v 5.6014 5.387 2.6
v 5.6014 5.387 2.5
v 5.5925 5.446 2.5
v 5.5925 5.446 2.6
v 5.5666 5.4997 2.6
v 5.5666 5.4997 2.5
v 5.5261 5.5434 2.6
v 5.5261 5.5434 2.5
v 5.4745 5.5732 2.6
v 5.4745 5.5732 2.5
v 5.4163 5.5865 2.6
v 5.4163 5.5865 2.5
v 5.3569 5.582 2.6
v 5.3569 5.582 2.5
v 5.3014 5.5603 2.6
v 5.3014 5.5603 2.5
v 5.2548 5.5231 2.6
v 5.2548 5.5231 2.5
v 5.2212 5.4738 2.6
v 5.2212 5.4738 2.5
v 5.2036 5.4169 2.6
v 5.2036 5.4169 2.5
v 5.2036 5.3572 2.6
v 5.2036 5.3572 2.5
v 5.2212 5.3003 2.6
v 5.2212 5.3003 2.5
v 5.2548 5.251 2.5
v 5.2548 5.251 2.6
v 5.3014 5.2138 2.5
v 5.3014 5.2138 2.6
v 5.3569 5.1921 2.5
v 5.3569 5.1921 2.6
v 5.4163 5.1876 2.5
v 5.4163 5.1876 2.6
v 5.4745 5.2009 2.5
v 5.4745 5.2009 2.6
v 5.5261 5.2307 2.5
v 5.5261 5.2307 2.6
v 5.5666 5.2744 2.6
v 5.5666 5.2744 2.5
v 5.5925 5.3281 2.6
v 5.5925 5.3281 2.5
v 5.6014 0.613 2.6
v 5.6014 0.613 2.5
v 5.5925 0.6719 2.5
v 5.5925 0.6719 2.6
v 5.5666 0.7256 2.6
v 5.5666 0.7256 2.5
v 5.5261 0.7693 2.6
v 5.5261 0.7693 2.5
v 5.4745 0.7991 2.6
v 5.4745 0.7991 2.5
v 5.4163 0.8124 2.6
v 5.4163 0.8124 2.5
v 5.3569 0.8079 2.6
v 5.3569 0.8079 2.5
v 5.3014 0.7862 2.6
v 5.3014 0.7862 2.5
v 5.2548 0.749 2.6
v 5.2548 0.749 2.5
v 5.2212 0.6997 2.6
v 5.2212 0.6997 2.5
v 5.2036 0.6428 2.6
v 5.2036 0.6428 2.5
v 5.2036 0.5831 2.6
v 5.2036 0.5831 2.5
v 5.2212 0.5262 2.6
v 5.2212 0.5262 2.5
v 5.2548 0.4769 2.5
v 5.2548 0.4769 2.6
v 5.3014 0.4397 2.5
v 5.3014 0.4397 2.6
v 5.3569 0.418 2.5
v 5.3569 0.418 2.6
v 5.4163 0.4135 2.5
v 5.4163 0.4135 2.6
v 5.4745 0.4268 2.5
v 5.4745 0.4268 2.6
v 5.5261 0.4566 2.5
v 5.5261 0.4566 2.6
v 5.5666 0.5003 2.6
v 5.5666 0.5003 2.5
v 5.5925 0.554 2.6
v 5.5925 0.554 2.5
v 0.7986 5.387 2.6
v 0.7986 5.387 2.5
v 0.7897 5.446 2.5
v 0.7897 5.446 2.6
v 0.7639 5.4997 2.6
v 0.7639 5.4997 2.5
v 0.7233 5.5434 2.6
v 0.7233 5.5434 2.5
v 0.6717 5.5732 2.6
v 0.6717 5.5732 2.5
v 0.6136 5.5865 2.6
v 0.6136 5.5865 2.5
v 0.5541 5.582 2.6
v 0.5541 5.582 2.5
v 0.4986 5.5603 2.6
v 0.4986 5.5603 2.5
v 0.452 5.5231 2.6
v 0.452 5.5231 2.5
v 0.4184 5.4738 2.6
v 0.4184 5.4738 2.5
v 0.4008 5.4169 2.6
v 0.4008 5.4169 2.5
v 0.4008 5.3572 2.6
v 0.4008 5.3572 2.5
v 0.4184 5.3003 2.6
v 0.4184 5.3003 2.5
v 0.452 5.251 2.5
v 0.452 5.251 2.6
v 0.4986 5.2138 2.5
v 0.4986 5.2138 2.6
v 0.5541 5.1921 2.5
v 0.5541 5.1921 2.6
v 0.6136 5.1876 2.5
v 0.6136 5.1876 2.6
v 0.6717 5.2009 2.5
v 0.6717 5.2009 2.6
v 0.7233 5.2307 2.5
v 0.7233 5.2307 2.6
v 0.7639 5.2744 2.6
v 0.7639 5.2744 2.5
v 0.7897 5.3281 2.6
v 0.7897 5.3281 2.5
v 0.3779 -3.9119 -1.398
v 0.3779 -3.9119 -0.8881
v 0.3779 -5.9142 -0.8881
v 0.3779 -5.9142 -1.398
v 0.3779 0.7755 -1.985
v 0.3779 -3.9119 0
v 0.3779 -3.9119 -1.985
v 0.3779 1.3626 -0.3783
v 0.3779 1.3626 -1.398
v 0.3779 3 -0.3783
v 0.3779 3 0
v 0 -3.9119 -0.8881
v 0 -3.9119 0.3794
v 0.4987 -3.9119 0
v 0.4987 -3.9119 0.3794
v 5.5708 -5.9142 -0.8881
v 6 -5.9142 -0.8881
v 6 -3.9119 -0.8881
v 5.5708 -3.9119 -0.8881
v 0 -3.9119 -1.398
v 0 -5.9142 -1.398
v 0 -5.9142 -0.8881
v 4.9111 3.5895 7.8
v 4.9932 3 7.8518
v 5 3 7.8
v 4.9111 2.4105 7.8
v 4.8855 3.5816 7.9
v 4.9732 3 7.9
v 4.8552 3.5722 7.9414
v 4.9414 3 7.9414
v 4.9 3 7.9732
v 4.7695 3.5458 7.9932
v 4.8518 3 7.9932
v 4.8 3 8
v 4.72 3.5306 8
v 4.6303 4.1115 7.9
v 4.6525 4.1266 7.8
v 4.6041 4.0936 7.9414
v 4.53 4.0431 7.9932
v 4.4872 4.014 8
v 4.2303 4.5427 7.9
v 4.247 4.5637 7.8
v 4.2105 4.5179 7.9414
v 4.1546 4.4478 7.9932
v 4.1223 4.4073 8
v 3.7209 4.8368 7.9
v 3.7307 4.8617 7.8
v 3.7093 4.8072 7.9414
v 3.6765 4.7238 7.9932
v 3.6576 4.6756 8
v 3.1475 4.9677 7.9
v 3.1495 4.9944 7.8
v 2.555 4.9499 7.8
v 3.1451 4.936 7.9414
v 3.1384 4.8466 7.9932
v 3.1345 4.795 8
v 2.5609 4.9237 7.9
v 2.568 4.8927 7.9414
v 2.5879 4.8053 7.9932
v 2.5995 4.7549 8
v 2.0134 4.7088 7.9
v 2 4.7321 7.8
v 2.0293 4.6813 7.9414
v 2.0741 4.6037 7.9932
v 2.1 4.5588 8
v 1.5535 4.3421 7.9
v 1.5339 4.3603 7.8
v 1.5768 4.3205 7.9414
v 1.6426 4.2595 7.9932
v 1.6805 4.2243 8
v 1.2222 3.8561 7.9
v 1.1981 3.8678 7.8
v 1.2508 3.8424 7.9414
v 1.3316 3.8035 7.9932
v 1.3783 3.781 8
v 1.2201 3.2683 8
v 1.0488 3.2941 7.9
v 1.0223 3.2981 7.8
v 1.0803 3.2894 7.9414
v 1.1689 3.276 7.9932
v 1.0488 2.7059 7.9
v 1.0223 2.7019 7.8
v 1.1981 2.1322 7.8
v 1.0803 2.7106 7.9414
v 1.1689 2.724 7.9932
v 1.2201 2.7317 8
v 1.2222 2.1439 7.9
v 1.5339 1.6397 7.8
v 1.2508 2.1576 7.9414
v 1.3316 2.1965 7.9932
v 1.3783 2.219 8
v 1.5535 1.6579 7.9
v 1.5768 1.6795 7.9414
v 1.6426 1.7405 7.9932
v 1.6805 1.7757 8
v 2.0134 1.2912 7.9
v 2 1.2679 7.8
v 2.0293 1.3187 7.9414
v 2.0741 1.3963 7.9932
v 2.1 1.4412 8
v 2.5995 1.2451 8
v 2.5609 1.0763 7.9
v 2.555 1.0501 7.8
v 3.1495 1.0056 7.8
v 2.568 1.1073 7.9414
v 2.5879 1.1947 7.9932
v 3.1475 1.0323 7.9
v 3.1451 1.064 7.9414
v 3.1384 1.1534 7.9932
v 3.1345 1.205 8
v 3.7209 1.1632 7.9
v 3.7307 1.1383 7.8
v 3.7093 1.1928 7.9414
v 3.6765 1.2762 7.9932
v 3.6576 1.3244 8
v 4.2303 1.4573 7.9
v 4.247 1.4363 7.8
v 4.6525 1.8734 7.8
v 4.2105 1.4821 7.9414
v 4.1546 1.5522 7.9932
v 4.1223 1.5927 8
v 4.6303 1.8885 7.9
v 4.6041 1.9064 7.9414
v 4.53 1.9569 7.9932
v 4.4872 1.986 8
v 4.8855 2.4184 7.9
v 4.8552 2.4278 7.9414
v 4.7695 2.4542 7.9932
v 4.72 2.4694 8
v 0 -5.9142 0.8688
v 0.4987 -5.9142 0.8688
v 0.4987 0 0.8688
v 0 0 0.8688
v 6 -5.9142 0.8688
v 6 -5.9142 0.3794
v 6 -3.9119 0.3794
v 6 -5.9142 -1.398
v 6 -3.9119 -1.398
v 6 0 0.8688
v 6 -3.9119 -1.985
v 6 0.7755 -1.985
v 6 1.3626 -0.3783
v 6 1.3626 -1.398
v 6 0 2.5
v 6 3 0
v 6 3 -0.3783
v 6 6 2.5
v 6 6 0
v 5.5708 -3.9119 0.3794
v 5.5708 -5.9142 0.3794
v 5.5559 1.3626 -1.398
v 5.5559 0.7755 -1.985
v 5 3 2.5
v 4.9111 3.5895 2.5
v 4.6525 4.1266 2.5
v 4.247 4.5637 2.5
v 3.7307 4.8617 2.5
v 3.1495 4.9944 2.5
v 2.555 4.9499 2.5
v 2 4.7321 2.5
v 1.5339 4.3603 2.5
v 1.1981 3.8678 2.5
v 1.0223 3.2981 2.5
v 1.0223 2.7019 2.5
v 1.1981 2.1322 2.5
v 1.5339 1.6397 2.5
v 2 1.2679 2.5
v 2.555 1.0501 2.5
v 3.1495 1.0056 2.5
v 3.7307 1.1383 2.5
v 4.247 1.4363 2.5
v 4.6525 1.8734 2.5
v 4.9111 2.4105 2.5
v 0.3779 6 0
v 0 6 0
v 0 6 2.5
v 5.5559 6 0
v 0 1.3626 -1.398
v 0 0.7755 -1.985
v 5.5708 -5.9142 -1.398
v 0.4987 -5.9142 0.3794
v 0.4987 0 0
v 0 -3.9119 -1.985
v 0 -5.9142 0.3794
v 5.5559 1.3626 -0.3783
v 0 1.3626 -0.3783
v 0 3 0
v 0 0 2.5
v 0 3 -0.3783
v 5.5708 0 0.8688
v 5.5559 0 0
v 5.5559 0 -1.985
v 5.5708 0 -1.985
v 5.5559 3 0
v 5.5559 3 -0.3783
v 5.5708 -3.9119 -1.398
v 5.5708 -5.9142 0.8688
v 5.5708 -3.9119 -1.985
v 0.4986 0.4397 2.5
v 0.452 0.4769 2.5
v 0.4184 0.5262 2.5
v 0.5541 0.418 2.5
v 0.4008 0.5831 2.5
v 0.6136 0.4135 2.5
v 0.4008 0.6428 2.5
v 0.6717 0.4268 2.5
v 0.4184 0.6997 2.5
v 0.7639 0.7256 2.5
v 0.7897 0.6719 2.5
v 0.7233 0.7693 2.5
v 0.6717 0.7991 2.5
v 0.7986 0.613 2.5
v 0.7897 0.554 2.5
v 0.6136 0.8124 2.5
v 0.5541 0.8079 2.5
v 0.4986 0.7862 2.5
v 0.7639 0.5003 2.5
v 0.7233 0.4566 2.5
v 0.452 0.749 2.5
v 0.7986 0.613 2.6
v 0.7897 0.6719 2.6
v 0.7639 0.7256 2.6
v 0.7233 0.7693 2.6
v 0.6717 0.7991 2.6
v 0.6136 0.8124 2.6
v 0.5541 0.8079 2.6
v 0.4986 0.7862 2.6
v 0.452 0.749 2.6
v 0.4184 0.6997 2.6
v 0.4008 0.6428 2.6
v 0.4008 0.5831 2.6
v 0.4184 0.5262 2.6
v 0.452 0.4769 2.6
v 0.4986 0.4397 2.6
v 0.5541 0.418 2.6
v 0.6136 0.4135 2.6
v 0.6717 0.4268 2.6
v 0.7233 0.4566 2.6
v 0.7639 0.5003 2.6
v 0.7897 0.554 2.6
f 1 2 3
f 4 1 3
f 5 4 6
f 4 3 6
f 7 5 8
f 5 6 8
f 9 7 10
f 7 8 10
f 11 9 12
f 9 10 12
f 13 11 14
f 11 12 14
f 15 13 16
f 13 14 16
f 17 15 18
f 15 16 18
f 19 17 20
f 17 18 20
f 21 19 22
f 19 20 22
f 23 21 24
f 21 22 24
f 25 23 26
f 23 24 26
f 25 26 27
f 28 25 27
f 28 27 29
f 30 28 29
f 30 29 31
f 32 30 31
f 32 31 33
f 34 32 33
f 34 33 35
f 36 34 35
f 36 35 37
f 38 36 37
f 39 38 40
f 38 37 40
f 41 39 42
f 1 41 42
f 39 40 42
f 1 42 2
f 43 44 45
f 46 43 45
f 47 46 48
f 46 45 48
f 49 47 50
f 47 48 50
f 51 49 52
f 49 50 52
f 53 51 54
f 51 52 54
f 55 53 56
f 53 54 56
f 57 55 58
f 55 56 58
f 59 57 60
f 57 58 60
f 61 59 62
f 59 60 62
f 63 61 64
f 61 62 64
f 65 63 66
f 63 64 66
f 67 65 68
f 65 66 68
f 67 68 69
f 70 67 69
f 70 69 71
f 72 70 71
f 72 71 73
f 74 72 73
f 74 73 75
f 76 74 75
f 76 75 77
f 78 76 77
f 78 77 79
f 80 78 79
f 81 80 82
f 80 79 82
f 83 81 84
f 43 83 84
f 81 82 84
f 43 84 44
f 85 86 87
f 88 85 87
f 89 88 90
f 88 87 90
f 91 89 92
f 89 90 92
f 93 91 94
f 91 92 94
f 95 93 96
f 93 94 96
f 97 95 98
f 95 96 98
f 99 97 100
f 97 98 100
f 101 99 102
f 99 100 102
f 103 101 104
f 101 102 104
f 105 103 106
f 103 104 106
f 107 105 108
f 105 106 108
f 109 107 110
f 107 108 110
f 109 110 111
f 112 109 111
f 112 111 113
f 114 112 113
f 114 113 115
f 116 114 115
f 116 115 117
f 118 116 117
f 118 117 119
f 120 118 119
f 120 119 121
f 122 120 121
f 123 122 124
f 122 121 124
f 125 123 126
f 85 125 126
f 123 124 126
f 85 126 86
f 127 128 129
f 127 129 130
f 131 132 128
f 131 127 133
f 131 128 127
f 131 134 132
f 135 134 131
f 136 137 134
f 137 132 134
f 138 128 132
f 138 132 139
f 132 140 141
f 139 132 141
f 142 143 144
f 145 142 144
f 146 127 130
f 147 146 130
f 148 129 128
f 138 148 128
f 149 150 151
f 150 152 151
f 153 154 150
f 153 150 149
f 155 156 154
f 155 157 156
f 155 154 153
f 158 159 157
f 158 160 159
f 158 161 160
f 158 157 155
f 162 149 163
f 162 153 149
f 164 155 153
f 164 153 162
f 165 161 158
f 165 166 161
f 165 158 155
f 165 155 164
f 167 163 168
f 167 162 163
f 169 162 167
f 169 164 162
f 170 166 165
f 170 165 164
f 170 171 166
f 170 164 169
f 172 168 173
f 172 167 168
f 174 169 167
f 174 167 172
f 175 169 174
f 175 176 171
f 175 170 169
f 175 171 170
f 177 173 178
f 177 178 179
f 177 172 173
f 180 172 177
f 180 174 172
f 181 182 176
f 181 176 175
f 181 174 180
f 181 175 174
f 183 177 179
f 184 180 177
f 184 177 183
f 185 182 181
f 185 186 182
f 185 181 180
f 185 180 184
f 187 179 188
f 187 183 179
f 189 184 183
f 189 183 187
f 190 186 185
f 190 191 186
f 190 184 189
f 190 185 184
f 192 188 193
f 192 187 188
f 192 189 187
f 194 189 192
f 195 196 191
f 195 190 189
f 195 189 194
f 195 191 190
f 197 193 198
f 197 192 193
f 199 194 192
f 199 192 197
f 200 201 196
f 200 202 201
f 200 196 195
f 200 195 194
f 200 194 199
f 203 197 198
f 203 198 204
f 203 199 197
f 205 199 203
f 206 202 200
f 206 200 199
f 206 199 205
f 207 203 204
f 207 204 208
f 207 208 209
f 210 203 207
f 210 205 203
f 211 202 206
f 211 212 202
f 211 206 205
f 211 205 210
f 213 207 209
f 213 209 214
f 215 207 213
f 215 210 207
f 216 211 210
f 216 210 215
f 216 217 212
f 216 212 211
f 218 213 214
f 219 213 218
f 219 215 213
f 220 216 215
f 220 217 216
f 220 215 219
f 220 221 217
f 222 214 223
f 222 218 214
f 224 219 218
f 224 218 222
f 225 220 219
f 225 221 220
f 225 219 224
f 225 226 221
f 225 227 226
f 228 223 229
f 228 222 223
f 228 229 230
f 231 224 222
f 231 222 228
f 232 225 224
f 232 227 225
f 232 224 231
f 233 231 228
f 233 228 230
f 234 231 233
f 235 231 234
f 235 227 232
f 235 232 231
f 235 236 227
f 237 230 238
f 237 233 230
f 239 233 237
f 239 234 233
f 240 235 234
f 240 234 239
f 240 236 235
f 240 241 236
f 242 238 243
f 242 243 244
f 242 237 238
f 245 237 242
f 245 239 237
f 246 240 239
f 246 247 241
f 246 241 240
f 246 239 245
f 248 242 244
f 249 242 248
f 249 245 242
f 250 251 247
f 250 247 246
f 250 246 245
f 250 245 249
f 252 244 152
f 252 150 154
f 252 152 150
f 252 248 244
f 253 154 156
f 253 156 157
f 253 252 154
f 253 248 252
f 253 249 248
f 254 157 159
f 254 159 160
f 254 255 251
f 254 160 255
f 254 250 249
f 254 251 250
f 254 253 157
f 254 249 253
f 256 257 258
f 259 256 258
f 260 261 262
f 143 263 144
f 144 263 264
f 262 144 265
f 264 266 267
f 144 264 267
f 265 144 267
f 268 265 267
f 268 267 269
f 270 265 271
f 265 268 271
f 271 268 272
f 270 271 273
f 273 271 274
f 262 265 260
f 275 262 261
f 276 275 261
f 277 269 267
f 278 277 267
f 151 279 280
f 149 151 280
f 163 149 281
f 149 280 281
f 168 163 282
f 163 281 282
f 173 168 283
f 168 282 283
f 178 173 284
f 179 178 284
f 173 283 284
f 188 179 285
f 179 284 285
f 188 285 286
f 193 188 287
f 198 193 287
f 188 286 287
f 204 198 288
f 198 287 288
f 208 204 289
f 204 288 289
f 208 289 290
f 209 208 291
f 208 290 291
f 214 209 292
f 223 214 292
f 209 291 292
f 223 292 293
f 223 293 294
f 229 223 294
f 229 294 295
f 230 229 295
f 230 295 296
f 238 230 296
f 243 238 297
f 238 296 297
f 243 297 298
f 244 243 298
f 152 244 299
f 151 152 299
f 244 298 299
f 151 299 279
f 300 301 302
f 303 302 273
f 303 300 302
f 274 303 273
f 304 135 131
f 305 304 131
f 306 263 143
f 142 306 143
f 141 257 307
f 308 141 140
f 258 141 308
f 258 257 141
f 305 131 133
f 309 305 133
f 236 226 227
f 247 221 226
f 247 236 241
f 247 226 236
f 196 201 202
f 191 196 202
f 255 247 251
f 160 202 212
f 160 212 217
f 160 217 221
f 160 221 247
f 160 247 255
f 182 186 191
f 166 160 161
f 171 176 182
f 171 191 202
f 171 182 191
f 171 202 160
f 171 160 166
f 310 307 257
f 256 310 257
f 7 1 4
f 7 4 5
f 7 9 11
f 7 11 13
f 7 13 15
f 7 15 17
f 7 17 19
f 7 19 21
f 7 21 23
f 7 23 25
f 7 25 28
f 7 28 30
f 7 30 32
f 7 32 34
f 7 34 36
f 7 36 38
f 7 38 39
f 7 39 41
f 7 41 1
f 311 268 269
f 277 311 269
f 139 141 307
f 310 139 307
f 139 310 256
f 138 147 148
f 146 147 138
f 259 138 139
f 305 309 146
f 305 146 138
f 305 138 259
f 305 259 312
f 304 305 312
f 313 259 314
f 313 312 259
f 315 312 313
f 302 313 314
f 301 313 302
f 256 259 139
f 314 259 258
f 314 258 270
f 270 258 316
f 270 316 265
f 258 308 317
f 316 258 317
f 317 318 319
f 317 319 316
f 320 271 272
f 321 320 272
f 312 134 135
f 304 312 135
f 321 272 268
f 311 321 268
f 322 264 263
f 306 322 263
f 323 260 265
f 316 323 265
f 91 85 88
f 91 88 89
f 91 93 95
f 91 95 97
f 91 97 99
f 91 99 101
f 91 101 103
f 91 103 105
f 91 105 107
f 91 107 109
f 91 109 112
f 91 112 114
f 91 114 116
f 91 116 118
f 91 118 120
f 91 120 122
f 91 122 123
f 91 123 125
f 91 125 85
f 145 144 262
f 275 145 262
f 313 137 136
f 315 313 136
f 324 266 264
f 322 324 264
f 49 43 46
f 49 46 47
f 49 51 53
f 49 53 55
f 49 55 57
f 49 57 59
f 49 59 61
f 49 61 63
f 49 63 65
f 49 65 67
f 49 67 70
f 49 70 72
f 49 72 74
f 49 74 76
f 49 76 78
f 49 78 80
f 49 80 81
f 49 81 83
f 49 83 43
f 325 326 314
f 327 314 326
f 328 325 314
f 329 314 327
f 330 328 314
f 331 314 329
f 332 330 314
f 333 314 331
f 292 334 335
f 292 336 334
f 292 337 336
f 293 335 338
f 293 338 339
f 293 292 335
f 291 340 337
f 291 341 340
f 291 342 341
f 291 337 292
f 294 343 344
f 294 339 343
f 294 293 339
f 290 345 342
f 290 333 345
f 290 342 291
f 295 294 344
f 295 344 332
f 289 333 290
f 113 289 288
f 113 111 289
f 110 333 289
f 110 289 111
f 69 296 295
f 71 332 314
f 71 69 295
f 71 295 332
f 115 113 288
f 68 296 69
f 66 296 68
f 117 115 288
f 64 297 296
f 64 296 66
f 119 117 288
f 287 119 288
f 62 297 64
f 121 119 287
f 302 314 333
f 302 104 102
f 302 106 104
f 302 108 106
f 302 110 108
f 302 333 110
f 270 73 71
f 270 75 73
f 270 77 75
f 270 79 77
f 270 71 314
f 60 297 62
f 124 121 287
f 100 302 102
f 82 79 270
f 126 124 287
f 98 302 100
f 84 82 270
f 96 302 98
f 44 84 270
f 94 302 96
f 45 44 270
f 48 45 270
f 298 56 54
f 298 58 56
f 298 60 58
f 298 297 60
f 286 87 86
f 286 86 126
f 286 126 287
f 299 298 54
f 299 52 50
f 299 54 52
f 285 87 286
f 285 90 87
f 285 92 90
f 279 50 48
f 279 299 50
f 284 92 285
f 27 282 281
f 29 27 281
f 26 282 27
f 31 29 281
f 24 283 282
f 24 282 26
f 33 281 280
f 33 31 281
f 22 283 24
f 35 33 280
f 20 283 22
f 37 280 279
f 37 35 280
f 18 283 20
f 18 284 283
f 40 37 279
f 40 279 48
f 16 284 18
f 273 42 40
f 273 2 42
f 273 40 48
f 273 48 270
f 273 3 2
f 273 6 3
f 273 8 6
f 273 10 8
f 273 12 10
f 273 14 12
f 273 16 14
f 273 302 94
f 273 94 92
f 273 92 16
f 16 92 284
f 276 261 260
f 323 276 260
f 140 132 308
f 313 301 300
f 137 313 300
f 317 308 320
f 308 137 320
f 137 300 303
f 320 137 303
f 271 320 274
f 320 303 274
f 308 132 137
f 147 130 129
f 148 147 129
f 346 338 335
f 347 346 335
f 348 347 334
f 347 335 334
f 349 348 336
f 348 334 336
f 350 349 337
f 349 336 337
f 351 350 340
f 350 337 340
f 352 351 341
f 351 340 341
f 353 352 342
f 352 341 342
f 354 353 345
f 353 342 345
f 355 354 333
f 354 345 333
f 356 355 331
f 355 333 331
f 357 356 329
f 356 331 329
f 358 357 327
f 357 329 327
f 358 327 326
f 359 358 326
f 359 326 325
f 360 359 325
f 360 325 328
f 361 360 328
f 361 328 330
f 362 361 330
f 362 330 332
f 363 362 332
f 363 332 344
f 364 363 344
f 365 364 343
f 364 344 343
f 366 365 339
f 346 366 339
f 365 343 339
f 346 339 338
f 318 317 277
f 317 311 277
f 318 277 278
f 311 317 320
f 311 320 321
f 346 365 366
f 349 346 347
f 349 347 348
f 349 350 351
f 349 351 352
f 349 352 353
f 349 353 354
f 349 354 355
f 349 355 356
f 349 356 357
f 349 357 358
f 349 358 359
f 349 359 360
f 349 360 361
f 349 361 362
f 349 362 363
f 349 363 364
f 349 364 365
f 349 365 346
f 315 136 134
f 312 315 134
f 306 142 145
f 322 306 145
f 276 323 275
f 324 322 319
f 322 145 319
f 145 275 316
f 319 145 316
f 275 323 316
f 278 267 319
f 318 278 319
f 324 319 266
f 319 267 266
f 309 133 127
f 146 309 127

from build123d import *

# Parameters (mm, degrees)
SKETCH1_W               = 6
SKETCH1_H               = 6
BOSS_EXTRUDE1_DEPTH     = 2.5
SKETCH2_R               = 2
BOSS_EXTRUDE2_DEPTH     = 5.5
SKETCH3_R               = 0.2
BOSS_EXTRUDE3_DEPTH     = 0.1
BOSS_EXTRUDE4_DEPTH     = 6
SKETCH5_W               = 5.177961038
SKETCH5_H               = 4.130239003
CUT_EXTRUDE1_DEPTH      = 1
CUT_EXTRUDE1_DEPTH_BACK = 12.914158668
SKETCH6_W               = 5.072029737
SKETCH6_H               = 6.679255732
CUT_EXTRUDE2_DEPTH      = 8.131207494
CUT_EXTRUDE2_DEPTH_BACK = 3.853830155
FILLET1_R               = 0.2


with BuildPart() as part:
    # Sketch1 → Boss-Extrude1 (new body)
    with BuildSketch(Plane.XY):
        with Locations((3, 3)):
            Rectangle(SKETCH1_W, SKETCH1_H)
    extrude(amount=BOSS_EXTRUDE1_DEPTH)

    # Sketch3 → Boss-Extrude3 (add)
    with BuildSketch(Plane.XY.offset(2.5)):
        with Locations((0.598613773, 0.612952074)):
            Circle(SKETCH3_R)
        with Locations((5.401386227, 0.612952074)):
            Circle(SKETCH3_R)
        with Locations((5.401386227, 5.387047926)):
            Circle(SKETCH3_R)
        with Locations((0.598613773, 5.387047926)):
            Circle(SKETCH3_R)
    extrude(amount=BOSS_EXTRUDE3_DEPTH)



with BuildPart() as body_2:
    # Sketch2 → Boss-Extrude2 (new body)
    with BuildSketch(Plane.XY.offset(2.5)):
        with Locations((3, 3)):
            Circle(SKETCH2_R)
    extrude(amount=BOSS_EXTRUDE2_DEPTH)


with BuildPart() as part_1:
    add(part.part)

    add(body_2.part)  # Boss-Extrude4 merges body 2
    # Sketch4 → Boss-Extrude4 (add)
    with BuildSketch(Plane(origin=(6, 0, 0), x_dir=(0, 0, -1), z_dir=(1, 0, 0))):
        Polygon((-2.5, 3), (0.378290485, 3), (0.378290485, 1.362552045), (1.397956954, 1.362552045), (1.985037649, 0.77547135), (1.985037649, -3.91190451), (1.397956954, -3.91190451), (1.397956954, -5.914158668), (0.88812372, -5.914158668), (0.88812372, -3.91190451), (-0.379352601, -3.91190451), (-0.379352601, -5.914158668), (-0.868792506, -5.914158668), (-0.868792506, 0), (-2.5, 0), align=None)
    extrude(amount=-BOSS_EXTRUDE4_DEPTH)

    # Sketch5 → Cut-Extrude1 (cut, two sides)
    with BuildSketch(Plane(origin=(0, 6, 0), x_dir=(1, 0, 0), z_dir=(0, 1, 0))) as cut_extrude1_sk:
        with Locations((2.966920818, 2.065119502)):
            Rectangle(SKETCH5_W, SKETCH5_H)
    extrude(amount=CUT_EXTRUDE1_DEPTH, mode=Mode.SUBTRACT)
    extrude(cut_extrude1_sk.sketch, amount=-CUT_EXTRUDE1_DEPTH_BACK, mode=Mode.SUBTRACT)

    # Sketch6 → Cut-Extrude2 (cut, two sides)
    with BuildSketch(Plane.XY.offset(0.868792506)) as cut_extrude2_sk:
        with Locations((3.03473993, -3.339627866)):
            Rectangle(SKETCH6_W, SKETCH6_H)
    extrude(amount=CUT_EXTRUDE2_DEPTH, mode=Mode.SUBTRACT)
    extrude(cut_extrude2_sk.sketch, amount=-CUT_EXTRUDE2_DEPTH_BACK, mode=Mode.SUBTRACT)

    # Fillet1
    fillet1_edges = [part_1.edges().sort_by_distance(p)[0] for p in [
        (1, 3, 8),
    ]]
    fillet(fillet1_edges, radius=FILLET1_R)


solid = part_1.part
